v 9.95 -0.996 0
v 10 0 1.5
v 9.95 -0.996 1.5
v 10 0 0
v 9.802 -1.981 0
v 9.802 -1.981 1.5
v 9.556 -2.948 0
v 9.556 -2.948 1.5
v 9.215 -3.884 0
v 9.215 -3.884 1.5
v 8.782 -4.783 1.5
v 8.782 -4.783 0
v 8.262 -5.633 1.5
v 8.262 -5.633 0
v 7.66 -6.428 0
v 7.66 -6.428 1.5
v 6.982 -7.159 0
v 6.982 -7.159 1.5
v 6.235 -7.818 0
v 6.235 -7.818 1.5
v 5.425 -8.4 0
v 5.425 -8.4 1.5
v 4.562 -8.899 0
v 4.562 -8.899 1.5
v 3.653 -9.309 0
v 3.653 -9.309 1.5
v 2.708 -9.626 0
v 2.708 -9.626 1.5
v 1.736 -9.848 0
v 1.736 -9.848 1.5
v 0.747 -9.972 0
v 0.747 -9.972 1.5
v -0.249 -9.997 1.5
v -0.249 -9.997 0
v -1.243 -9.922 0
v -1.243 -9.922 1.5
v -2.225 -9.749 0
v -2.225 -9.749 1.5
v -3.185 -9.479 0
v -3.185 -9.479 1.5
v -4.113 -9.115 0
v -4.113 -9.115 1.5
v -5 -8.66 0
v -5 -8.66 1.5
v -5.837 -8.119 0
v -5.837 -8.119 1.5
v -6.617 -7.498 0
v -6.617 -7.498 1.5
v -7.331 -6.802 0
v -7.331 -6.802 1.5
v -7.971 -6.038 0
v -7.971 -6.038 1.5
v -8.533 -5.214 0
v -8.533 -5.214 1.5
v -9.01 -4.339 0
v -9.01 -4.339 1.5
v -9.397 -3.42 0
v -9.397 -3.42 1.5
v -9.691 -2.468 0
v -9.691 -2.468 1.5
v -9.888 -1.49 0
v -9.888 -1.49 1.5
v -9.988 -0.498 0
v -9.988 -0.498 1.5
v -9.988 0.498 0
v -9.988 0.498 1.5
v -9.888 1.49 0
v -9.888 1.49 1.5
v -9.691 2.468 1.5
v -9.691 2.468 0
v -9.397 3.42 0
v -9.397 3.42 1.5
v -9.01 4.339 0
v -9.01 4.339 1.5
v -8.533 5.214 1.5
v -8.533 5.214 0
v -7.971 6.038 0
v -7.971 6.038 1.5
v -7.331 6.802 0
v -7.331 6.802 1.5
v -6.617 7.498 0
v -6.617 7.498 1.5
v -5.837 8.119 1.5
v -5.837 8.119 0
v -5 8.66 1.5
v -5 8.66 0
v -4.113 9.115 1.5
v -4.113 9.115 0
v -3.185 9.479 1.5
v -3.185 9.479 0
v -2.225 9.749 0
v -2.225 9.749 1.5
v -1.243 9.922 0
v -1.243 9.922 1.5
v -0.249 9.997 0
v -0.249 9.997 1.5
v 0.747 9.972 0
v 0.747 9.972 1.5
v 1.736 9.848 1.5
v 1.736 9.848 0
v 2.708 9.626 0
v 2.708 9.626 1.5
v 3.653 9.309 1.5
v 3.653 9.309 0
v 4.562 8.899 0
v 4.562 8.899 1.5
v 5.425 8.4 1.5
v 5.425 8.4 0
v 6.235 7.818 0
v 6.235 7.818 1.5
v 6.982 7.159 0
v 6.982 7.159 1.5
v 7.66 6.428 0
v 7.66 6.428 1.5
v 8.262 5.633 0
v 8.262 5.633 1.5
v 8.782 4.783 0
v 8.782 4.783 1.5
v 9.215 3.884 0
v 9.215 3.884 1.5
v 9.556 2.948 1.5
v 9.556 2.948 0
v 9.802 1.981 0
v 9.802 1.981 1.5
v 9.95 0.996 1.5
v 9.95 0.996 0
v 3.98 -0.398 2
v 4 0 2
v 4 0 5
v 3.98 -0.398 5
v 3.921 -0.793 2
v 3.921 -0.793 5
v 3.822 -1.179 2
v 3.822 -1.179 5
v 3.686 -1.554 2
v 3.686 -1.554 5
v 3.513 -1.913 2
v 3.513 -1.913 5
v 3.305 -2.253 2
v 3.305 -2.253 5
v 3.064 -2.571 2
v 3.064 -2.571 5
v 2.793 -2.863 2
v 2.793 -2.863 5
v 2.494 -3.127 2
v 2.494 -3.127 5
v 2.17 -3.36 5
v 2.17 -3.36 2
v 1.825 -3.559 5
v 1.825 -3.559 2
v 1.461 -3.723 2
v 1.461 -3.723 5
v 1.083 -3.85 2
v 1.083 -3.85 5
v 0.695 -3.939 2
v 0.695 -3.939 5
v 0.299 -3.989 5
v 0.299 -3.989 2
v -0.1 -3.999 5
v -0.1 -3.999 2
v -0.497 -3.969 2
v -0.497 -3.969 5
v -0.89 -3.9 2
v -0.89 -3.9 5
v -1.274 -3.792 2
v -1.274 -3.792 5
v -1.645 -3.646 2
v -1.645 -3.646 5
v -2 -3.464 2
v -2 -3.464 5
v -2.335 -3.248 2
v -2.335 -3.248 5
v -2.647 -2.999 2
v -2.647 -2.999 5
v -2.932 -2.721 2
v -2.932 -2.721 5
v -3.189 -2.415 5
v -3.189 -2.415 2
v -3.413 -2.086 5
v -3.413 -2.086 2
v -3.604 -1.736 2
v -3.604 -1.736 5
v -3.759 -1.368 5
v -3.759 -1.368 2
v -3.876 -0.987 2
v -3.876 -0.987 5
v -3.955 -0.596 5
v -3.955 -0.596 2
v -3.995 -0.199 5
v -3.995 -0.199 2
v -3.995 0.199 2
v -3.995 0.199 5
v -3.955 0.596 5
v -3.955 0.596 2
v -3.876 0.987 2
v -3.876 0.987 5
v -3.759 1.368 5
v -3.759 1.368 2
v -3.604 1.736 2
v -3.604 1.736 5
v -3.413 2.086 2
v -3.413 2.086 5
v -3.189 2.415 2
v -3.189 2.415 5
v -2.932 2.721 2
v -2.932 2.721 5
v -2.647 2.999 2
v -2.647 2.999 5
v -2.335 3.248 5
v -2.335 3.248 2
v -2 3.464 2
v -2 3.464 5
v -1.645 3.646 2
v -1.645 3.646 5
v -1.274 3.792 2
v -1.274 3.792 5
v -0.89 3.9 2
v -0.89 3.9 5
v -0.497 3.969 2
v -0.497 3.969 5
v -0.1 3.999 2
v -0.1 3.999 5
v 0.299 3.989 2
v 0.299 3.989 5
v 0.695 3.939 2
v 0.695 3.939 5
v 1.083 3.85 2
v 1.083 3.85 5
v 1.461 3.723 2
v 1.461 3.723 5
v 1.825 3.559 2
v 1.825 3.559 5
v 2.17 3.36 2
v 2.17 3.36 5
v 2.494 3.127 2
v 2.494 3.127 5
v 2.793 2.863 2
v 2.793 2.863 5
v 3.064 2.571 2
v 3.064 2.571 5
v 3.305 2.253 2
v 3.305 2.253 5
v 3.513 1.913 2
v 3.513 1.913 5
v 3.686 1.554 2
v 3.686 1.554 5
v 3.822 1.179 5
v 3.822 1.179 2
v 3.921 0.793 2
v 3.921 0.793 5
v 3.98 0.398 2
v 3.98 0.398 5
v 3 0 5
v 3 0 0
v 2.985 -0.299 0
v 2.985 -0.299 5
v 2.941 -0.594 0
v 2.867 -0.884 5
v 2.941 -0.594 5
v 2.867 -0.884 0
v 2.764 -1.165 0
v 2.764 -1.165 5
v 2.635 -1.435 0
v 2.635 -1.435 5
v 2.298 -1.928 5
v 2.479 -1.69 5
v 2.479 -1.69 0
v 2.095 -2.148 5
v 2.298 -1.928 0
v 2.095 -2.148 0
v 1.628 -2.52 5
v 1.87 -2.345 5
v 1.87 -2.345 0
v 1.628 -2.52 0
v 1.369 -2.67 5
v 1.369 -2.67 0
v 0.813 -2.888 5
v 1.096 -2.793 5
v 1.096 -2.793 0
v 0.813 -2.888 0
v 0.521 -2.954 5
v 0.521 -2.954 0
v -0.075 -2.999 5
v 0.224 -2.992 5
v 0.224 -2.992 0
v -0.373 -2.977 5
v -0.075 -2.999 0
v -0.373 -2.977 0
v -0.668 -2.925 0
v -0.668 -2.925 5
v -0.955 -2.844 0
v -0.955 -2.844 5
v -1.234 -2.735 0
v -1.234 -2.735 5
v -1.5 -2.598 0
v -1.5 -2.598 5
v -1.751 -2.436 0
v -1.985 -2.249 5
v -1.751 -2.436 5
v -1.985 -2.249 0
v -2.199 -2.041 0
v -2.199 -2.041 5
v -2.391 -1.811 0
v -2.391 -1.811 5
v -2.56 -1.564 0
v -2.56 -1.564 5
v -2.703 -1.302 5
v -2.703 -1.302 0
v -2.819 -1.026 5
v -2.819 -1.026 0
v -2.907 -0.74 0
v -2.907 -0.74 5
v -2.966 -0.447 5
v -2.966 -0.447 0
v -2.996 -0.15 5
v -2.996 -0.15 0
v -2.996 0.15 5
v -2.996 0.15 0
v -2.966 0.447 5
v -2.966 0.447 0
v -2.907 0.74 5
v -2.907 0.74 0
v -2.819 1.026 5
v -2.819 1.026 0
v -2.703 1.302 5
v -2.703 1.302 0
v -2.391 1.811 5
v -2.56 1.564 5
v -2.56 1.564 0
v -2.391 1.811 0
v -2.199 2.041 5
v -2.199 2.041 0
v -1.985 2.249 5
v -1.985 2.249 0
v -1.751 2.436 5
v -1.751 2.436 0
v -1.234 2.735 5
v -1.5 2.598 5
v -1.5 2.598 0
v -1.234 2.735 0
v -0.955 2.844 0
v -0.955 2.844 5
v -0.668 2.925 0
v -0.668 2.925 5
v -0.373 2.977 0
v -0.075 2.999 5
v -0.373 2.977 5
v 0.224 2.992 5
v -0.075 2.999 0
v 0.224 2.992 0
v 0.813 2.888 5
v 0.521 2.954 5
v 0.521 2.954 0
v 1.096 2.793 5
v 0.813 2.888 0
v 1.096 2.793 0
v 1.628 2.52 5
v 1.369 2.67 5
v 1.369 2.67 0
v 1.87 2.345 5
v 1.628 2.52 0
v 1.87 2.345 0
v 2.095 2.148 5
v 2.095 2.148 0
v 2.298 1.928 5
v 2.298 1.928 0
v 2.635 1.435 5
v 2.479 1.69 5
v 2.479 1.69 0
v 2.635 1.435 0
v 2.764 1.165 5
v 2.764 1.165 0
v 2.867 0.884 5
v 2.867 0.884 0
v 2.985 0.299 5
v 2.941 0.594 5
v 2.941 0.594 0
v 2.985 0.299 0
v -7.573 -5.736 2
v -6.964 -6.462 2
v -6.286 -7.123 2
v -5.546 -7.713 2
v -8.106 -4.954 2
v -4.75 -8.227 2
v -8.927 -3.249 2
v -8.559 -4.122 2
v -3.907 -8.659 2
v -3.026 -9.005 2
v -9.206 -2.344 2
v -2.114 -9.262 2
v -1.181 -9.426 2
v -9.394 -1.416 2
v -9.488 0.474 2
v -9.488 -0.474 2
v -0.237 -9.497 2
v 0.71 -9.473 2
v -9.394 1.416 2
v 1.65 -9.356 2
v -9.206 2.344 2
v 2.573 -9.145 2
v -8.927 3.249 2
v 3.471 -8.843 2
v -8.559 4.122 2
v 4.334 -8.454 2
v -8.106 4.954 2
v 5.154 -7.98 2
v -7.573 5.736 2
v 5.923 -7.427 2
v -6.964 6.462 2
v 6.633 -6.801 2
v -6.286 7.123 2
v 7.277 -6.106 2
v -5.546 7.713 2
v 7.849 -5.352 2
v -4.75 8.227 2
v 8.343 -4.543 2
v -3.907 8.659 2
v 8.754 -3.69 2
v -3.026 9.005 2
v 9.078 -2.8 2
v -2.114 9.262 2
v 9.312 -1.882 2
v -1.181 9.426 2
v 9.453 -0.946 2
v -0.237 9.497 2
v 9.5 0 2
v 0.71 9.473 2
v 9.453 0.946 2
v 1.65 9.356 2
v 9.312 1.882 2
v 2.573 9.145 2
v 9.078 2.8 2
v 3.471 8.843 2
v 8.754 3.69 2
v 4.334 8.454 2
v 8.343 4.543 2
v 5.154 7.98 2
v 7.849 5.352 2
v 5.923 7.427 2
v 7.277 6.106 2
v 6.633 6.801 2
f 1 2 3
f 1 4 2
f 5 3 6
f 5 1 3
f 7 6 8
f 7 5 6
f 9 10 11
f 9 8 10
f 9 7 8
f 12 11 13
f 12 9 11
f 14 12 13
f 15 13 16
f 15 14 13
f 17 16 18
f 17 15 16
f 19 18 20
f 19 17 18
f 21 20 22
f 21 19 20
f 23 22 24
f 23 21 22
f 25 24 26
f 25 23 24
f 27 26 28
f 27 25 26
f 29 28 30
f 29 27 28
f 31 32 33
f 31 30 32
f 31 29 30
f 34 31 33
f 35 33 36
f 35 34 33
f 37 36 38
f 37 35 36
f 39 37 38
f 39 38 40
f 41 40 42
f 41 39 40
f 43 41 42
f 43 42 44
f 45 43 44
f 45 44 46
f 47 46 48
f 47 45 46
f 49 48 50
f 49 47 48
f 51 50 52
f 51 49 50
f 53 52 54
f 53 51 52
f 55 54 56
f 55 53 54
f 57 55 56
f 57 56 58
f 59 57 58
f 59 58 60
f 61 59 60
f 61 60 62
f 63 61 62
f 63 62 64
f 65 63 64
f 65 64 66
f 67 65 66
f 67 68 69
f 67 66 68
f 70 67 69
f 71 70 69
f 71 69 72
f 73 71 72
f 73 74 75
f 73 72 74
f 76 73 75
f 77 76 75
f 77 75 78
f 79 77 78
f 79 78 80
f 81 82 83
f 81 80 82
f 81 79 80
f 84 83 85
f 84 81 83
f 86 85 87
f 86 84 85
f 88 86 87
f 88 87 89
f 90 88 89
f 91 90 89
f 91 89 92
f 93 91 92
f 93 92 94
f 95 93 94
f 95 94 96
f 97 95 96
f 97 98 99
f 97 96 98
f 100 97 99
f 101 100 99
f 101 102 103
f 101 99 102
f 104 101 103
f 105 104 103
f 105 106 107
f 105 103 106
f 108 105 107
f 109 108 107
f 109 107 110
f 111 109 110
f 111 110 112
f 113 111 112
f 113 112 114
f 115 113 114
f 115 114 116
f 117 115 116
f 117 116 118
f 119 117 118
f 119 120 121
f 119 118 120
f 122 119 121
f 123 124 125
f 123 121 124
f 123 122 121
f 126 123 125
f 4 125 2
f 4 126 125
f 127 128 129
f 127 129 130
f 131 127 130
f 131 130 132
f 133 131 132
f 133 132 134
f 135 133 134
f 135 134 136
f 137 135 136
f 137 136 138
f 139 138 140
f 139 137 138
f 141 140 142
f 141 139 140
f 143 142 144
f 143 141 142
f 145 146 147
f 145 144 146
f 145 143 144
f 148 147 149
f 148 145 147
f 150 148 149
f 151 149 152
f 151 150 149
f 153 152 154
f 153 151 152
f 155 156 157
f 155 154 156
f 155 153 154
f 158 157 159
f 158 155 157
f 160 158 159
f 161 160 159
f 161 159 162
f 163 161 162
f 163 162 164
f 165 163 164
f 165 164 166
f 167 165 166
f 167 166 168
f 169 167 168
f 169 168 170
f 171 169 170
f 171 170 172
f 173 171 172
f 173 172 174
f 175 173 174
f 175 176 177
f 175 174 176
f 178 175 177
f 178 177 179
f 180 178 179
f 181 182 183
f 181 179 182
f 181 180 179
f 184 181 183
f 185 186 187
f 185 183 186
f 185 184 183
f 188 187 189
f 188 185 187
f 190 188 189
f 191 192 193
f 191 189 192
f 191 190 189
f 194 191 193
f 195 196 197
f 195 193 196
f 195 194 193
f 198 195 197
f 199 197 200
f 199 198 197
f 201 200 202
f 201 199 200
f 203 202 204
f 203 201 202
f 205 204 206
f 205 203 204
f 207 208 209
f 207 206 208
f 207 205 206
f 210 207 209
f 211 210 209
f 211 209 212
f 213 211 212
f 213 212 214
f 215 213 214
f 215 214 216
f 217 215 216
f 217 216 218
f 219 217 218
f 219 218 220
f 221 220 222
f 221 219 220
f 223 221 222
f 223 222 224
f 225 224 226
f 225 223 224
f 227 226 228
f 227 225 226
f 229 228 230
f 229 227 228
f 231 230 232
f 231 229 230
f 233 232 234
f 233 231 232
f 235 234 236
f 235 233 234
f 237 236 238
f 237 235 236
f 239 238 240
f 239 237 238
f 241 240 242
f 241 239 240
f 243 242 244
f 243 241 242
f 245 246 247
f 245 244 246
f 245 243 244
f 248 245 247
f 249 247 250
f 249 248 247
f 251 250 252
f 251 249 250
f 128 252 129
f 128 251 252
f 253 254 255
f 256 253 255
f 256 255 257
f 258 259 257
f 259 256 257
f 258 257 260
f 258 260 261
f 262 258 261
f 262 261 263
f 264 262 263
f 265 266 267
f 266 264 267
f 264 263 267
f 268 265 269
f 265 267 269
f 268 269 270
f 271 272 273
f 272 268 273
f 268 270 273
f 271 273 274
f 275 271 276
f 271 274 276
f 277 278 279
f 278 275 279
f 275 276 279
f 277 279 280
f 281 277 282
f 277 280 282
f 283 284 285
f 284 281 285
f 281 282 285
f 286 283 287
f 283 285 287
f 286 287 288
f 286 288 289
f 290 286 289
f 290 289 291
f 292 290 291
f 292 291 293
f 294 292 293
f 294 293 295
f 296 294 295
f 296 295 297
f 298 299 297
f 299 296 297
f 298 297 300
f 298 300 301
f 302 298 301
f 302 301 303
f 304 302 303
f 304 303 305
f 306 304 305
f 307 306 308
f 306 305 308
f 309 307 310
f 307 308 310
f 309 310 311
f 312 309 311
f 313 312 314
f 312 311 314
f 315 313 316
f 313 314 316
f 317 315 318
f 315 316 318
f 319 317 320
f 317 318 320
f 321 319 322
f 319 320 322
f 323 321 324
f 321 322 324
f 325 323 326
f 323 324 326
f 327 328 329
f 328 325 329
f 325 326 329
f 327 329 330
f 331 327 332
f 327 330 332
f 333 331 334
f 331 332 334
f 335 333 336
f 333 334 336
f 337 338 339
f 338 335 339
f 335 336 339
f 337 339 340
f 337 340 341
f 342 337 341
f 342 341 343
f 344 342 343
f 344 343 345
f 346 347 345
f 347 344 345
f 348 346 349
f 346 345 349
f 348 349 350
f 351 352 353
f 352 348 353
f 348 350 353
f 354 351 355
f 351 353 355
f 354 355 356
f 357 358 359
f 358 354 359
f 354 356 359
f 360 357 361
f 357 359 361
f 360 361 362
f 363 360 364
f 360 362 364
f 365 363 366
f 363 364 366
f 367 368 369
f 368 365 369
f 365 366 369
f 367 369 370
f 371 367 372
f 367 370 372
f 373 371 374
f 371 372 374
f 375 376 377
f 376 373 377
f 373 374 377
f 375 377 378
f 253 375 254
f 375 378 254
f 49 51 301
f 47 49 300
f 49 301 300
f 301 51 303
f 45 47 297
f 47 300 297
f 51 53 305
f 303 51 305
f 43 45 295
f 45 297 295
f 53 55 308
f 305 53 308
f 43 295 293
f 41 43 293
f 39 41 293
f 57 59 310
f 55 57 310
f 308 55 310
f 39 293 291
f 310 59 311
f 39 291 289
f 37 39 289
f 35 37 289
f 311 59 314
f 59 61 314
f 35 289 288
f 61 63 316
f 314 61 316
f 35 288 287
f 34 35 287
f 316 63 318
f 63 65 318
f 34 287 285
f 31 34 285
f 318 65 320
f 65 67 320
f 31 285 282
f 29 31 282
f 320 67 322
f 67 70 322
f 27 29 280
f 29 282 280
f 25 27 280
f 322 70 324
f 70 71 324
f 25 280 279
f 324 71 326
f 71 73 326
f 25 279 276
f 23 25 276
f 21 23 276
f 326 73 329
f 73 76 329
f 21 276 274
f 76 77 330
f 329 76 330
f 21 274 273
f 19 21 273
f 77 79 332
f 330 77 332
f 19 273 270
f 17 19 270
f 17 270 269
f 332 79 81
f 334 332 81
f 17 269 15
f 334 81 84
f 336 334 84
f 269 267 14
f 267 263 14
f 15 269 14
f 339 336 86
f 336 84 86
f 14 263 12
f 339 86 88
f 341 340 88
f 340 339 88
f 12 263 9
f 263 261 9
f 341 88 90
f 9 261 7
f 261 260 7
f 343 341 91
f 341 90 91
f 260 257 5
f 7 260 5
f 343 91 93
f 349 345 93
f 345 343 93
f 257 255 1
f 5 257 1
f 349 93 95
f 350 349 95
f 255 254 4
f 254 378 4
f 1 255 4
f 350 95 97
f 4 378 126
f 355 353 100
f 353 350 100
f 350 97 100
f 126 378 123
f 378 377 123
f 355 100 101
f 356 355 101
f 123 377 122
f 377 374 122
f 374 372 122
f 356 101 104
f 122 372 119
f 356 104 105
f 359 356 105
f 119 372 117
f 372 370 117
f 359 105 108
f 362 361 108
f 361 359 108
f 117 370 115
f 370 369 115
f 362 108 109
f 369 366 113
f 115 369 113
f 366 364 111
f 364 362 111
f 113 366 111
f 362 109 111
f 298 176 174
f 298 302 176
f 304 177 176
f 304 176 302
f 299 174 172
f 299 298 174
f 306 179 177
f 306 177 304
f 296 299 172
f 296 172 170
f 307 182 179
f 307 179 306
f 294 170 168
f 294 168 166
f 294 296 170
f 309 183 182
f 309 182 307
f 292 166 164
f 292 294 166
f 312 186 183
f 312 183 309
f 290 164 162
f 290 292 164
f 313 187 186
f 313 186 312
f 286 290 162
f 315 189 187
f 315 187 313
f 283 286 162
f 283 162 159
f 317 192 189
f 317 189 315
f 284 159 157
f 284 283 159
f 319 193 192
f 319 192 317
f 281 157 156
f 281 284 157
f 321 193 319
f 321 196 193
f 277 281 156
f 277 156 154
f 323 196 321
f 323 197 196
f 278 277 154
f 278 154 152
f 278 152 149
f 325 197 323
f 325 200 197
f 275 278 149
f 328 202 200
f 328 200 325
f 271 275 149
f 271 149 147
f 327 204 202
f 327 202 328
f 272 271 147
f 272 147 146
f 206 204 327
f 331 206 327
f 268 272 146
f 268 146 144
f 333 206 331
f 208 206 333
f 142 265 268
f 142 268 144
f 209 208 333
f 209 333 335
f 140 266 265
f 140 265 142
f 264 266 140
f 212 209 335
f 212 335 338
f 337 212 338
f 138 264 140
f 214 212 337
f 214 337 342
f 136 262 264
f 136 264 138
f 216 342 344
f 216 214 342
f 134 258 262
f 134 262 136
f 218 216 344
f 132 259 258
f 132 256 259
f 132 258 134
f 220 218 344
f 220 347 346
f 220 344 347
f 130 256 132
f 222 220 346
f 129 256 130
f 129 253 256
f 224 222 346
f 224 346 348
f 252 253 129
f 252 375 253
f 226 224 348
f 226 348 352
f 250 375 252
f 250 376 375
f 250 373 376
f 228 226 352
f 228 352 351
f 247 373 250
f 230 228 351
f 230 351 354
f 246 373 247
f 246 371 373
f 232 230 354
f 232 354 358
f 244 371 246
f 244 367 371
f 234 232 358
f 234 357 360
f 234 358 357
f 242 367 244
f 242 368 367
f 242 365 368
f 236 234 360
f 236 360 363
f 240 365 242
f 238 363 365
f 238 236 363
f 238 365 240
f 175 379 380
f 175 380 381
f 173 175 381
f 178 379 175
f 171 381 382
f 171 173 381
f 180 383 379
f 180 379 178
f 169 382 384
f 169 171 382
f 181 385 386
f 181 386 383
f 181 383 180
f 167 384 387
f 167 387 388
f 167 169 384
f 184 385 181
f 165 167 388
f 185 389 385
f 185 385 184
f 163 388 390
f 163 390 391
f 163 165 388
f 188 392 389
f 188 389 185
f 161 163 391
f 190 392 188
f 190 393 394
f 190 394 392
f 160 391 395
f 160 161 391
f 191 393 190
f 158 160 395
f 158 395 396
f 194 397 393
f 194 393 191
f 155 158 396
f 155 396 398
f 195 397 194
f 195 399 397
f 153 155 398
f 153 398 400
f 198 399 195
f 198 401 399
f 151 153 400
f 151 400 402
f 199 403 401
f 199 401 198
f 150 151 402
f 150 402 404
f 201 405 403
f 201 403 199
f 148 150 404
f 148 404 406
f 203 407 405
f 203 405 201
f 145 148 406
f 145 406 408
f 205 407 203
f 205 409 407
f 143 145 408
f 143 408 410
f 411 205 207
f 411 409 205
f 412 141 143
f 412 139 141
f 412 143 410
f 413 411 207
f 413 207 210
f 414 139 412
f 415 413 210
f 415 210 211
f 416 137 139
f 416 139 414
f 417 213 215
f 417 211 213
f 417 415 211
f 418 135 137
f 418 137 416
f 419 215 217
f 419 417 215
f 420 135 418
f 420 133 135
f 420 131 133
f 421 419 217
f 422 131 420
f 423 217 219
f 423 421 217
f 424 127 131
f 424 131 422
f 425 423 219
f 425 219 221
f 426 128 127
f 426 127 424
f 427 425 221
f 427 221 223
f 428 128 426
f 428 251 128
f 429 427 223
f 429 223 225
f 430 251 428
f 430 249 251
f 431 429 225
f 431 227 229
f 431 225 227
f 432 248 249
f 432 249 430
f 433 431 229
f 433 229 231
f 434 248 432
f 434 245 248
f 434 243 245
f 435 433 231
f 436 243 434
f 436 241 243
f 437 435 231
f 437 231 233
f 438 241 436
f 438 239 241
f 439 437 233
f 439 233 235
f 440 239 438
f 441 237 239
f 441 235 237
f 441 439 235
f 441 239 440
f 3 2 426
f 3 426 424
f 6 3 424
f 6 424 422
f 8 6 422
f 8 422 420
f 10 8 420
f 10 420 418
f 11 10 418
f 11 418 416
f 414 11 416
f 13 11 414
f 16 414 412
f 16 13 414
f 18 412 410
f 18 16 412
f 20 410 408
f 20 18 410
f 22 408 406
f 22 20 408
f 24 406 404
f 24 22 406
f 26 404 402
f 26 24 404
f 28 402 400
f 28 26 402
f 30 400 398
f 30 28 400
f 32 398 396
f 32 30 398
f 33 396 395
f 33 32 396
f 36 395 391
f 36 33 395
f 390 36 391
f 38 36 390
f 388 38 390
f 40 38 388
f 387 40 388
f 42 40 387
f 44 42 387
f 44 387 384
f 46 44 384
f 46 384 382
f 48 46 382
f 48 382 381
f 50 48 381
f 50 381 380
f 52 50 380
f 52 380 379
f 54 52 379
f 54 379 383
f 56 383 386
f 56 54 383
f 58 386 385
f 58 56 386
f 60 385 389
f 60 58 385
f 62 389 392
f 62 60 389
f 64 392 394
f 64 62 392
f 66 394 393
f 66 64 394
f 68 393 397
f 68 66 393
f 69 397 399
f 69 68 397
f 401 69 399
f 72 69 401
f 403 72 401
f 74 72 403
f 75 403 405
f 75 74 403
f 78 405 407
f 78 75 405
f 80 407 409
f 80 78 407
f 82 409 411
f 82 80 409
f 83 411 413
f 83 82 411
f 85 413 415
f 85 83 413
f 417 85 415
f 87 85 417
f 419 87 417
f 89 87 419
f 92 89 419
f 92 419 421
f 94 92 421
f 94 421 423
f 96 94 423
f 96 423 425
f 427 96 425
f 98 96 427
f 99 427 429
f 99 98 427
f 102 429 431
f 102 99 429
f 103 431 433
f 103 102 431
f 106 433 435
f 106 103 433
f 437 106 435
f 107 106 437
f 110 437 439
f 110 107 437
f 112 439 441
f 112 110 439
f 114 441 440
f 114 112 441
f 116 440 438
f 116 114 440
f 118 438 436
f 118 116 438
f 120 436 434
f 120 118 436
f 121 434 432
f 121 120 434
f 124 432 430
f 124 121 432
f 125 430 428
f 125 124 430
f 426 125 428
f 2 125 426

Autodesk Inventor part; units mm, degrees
ref_plane "YZ Plane" through (0, 0, 0) normal (1, 0, 0) x (0, 1, 0)
ref_plane "XZ Plane" through (0, 0, 0) normal (0, 1, 0) x (-1, 0, 0)
ref_plane "XY Plane" through (0, 0, 0) normal (0, 0, 1) x (1, 0, 0)
sketch "Sketch1" plane through (0, 0, 0) normal (0, 0, 1) x (1, 0, 0)
  circle A0 centre (0, 0) radius 10
  circle A1 centre (0, 0) radius 3
  dimension "d0" = 20
  dimension "d1" = 6
extrude "Extrusion1" add sketch "Sketch1" along normal blind 2
sketch "Sketch2" plane through (0, 0, 2) normal (0, 0, 1) x (1, 0, 0)
  circle A0 centre (0, 0) radius 4
  circle A1 centre (0, 0) radius 3 projected
  dimension "d4" = 8
extrude "Extrusion2" add sketch "Sketch2" along normal blind 3
chamfer "Chamfer1" distance 0.5 angle 45 1 edges at (-10, 0, 2)
properties part number "end eff servo-conector"
